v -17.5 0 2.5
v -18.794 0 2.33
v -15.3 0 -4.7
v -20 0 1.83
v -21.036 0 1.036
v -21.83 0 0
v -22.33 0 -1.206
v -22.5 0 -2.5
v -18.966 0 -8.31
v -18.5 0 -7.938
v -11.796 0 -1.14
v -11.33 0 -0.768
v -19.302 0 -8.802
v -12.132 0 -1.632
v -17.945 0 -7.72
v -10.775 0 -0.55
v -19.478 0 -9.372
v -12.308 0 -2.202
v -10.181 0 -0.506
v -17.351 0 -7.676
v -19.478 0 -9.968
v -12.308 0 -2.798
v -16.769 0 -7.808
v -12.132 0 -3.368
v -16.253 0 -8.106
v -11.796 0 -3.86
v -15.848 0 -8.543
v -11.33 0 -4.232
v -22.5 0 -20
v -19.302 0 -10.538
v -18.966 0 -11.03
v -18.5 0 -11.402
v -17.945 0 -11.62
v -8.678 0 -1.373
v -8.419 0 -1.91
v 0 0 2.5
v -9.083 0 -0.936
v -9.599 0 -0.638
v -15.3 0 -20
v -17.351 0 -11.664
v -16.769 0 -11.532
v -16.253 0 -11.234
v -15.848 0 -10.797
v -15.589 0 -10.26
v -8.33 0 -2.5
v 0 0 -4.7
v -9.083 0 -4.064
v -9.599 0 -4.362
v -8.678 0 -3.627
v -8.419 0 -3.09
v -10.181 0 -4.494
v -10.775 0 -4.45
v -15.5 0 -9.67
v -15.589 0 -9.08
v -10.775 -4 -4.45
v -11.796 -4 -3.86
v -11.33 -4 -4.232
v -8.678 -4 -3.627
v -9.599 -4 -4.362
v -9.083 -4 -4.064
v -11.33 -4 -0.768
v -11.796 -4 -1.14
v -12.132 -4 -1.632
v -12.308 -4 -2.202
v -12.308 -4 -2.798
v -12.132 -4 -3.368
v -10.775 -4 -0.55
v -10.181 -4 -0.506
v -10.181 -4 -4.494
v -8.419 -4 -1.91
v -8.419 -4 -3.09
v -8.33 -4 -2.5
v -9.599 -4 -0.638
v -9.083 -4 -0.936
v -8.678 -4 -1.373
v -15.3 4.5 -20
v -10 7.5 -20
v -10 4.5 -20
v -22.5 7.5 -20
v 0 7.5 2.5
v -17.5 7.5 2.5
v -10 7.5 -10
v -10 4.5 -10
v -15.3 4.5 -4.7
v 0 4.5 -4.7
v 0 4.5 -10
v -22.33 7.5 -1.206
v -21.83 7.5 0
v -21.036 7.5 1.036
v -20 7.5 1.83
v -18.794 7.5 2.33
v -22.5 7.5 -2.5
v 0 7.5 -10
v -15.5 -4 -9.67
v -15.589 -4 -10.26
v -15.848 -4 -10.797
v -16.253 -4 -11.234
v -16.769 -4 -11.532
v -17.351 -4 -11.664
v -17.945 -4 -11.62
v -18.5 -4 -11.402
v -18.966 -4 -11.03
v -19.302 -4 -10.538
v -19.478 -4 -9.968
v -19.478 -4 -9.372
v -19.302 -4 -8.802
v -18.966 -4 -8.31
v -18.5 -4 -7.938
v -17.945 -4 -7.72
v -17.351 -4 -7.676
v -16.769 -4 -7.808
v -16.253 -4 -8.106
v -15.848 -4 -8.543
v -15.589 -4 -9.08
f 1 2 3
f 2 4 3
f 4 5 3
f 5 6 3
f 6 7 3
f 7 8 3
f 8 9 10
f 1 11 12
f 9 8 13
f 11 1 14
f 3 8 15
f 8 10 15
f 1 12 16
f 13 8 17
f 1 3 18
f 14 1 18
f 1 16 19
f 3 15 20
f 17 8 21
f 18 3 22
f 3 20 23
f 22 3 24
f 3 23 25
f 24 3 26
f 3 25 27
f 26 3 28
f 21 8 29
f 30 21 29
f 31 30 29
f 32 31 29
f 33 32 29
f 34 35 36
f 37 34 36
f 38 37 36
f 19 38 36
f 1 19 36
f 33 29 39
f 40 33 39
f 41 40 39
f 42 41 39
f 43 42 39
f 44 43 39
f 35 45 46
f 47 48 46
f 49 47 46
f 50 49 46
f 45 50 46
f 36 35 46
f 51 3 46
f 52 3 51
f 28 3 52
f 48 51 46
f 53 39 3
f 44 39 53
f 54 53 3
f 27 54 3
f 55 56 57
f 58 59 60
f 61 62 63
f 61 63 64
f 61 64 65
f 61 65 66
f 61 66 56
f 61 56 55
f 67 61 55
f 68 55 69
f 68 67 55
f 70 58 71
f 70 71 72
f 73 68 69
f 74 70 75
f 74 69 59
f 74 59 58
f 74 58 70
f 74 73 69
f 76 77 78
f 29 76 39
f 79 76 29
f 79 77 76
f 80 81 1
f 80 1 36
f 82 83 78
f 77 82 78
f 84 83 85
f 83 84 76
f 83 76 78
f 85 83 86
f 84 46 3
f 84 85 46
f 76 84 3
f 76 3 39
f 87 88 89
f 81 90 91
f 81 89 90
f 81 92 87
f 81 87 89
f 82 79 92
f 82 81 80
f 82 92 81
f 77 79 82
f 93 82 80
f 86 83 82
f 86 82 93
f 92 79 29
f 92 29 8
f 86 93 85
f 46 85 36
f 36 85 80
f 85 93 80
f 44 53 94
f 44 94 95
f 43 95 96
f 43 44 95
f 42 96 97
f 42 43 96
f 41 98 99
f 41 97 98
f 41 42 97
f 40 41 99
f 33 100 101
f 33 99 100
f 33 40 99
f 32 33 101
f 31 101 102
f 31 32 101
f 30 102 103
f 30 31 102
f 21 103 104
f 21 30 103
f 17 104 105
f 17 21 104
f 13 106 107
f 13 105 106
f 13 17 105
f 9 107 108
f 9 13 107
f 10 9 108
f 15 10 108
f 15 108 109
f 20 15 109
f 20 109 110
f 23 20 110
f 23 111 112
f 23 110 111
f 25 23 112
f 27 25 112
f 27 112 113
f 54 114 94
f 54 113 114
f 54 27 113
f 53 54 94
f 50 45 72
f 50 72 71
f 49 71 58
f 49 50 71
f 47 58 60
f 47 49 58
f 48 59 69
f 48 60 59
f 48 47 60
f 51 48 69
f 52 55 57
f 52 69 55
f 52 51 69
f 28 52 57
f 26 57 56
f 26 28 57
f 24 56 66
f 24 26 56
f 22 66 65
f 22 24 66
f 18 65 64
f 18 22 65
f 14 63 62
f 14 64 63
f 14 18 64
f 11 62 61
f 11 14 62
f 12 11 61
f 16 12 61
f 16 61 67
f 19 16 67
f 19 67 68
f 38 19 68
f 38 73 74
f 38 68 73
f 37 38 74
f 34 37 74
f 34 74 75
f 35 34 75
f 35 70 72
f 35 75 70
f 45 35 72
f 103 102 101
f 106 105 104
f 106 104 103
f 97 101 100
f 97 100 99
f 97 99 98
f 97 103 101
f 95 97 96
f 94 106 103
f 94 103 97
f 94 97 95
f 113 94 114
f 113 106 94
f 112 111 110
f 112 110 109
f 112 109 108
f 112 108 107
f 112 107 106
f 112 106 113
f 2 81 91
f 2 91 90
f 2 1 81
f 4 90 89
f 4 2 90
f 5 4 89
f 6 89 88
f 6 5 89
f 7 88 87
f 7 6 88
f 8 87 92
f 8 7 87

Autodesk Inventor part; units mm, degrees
ref_plane "YZ Plane" through (0, 0, 0) normal (1, 0, 0) x (0, 1, 0)
ref_plane "XZ Plane" through (0, 0, 0) normal (0, 1, 0) x (-1, 0, 0)
ref_plane "XY Plane" through (0, 0, 0) normal (0, 0, 1) x (1, 0, 0)
sketch "Sketch1" plane through (0, 0, 0) normal (0, 1, 0) x (-1, 0, 0)
  line L0 (0, 0) -> (10, 0)
  line L1 (0, 0) -> (20, 0)
  line L2 (20, 0) -> (20, -20)
  line L3 (20, -20) -> (0, -20)
  line L4 (0, -10) -> (0, 0)
  line L5 (10, -10) -> (10, -20)
  line L6 (10, -10) -> (0, -10)
  dimension "d3" = 20
  dimension "d4" = 20
extrude "Extrusion1" add sketch "Sketch1" along normal blind 7.5
sketch "Sketch2" plane through (-10, 0, -10) normal (1, 0, 0) x (0, 0, -1)
  line L0 (0, 0) -> (10, 0) projected
  line L1 (10, 0) -> (10, 7.5) projected
  line L2 (0, 7.5) -> (10, 7.5) projected
  line L3 (0, 0) -> (0, 7.5) projected
  line L4 (-10, 0) -> (0, 0) projected
  line L5 (0, 0) -> (0, 7.5) projected
  line L6 (-10, 7.5) -> (0, 7.5) projected
  line L7 (-10, 0) -> (-10, 7.5) projected
  line L8 (10, 0) -> (10, 7.5) projected
  line L9 (10, 4.5) -> (-10, 4.5)
  point P0 (0, 4.5)
  dimension "d18" = 4.5
extrude "Extrusion2" cut sketch "Sketch2" against normal blind 5.3 contours L3 L9 L1 L0
sketch "Sketch3" plane through (0, 7.5, -10) normal (0, 0, -1) x (-1, 0, 0)
  line L0 (0, -7.5) -> (15.3, -7.5) projected
  line L1 (15.3, -7.5) -> (15.3, -3) projected
  line L2 (10, -3) -> (15.3, -3) projected
  line L3 (10, -3) -> (10, 0) projected
  line L4 (0, 0) -> (10, 0) projected
  line L5 (0, -7.5) -> (0, 0) projected
  line L6 (10, -3) -> (0, -3)
  line L7 (0, -7.5) -> (0, 0) projected
extrude "Extrusion3" cut sketch "Sketch3" against normal blind 5.3 contours L5 L6 L2 L1 L0
sketch "Sketch4" plane through (0, 0, 0) normal (0, -1, 0) x (1, 0, 0)
  line L0 (-15.3, -20) -> (-15.3, -4.7) projected
  line L1 (-15.3, -4.7) -> (0, -4.7) projected
  line L2 (0, 0) -> (0, -4.7) projected
  line L3 (-20, 0) -> (0, 0) projected
  line L4 (-20, -20) -> (-20, 0) projected
  line L5 (-15.3, -20) -> (-20, -20) projected
  line L6 (0, 0) -> (0, -10) projected
  circle A0 centre (-10.33, -2.5) radius 2
  circle A1 centre (-17.5, -9.67) radius 2
  dimension "d11" = 4
  dimension "d12" = 4
  dimension "d16" = 9.67
  dimension "d17" = 9.67
extrude "Extrusion4" add sketch "Sketch4" along normal blind 4 contours A0 | A1
fillet "Fillet1" radius 2 1 edges at (-20, 3.75, 0)
sketch "Sketch5" plane through (0, 7.5, 0) normal (0, 1, 0) x (1, 0, 0)
  arc A0 (-20, 2) -> (-18, 0) centre (-18, 2) ccw projected
  line L0 (-18, 0) -> (0, 0) projected
  line L1 (0, 0) -> (0, 10) projected
  line L2 (0, 10) -> (-10, 10) projected
  line L3 (-10, 10) -> (-10, 20) projected
  line L4 (-10, 20) -> (-20, 20) projected
  line L5 (-20, 20) -> (-20, 2) projected
  line L6 (2.5, 22.5) -> (-22.5, 22.5)
  line L7 (-22.5, 22.5) -> (-22.5, -2.5)
  line L8 (-22.5, -2.5) -> (2.5, -2.5)
  line L9 (2.5, -2.5) -> (2.5, 22.5)
  line L10 (2.5, 22.5) -> (-22.5, -2.5) construction
  line L11 (-22.5, 22.5) -> (2.5, -2.5) construction
  line L12 (-15.3, 20) -> (-20, 20) projected
  line L13 (-20, 20) -> (-22.5, 20)
  line L14 (0, 0) -> (0, -2.5)
  dimension "d19" = 25
  dimension "d20" = 25
extrude "Extrusion5" add sketch "Sketch5" against normal blind 7.5 contours A0 L0 L14 L8 L7 L13 L5
fillet "Fillet2" radius 5 1 edges at (-22.5, 3.75, 2.5)
properties part number "PresasPlaca_3DPrint"
